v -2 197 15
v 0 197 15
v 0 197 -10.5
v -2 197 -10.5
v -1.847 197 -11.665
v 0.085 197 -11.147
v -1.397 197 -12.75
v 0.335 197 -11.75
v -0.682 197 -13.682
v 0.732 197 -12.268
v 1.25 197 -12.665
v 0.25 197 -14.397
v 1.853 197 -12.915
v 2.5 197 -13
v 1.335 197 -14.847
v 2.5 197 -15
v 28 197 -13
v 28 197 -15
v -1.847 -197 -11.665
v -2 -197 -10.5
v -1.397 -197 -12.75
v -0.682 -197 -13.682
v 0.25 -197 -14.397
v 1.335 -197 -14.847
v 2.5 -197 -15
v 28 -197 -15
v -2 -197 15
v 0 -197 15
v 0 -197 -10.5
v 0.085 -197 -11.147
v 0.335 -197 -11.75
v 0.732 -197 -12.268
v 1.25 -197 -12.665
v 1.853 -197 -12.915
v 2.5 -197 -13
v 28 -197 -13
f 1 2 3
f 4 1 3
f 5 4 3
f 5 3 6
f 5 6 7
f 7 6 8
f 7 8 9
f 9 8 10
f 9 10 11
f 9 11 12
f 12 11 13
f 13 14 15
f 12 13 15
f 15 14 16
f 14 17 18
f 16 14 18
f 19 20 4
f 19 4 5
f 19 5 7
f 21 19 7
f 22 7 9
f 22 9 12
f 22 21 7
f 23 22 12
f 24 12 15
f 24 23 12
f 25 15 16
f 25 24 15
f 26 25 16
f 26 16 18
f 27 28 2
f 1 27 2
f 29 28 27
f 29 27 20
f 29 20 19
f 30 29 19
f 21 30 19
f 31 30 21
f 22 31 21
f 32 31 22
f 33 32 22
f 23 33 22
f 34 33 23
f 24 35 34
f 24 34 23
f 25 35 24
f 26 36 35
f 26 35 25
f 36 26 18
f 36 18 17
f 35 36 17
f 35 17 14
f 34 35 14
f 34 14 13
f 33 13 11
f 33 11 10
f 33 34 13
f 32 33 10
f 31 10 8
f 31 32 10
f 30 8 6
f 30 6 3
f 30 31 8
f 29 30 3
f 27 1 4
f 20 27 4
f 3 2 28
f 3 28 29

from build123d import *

# Parameters (mm, degrees)
SKETCH1_W                    = 30
SKETCH1_H                    = 394
BASE_FLANGE1_DEPTH           = 2
EDGE_FLANGE1_STRIP_W         = 13
EDGE_FLANGE1_STRIP_H         = 2
EDGE_FLANGE1_STRIP_CUT_DEPTH = 394
EDGE_FLANGE1_DEPTH           = 394


# Sheet-metal steps are written as plain solids
with BuildPart() as part:
    # Sketch1 → Base-Flange1 (new body)
    with BuildSketch(Plane(origin=(0, 0, 0), x_dir=(0, 0, -1), z_dir=(1, 0, 0))):
        Rectangle(SKETCH1_W, SKETCH1_H)
    extrude(amount=-BASE_FLANGE1_DEPTH)

    # Edge-Flange1 strip (across the edge) → Edge-Flange1 strip cut (cut)
    with BuildSketch(Plane(origin=(0, -197, -15), x_dir=(0, 0, 1), z_dir=(0, 1, 0))):
        with Locations((-2, -1)):
            Rectangle(EDGE_FLANGE1_STRIP_W, EDGE_FLANGE1_STRIP_H)
    extrude(amount=EDGE_FLANGE1_STRIP_CUT_DEPTH, mode=Mode.SUBTRACT)

    # Edge-Flange1 section (across the edge) → Edge-Flange1 (add)
    with BuildSketch(Plane(origin=(0, -197, -15), x_dir=(0, 0, 1), z_dir=(0, 1, 0))):
        with BuildLine():
            Line((0, 2.5), (0, 28))
            Line((0, 28), (2, 28))
            Line((2, 28), (2, 2.5))
            ThreePointArc((2, 2.5), (2.732233047, 0.732233047), (4.5, 0))
            Line((4.5, 0), (4.5, -2))
            ThreePointArc((4.5, -2), (1.318019485, -0.681980515), (0, 2.5))
        make_face()
    extrude(amount=EDGE_FLANGE1_DEPTH)


solid = part.part
